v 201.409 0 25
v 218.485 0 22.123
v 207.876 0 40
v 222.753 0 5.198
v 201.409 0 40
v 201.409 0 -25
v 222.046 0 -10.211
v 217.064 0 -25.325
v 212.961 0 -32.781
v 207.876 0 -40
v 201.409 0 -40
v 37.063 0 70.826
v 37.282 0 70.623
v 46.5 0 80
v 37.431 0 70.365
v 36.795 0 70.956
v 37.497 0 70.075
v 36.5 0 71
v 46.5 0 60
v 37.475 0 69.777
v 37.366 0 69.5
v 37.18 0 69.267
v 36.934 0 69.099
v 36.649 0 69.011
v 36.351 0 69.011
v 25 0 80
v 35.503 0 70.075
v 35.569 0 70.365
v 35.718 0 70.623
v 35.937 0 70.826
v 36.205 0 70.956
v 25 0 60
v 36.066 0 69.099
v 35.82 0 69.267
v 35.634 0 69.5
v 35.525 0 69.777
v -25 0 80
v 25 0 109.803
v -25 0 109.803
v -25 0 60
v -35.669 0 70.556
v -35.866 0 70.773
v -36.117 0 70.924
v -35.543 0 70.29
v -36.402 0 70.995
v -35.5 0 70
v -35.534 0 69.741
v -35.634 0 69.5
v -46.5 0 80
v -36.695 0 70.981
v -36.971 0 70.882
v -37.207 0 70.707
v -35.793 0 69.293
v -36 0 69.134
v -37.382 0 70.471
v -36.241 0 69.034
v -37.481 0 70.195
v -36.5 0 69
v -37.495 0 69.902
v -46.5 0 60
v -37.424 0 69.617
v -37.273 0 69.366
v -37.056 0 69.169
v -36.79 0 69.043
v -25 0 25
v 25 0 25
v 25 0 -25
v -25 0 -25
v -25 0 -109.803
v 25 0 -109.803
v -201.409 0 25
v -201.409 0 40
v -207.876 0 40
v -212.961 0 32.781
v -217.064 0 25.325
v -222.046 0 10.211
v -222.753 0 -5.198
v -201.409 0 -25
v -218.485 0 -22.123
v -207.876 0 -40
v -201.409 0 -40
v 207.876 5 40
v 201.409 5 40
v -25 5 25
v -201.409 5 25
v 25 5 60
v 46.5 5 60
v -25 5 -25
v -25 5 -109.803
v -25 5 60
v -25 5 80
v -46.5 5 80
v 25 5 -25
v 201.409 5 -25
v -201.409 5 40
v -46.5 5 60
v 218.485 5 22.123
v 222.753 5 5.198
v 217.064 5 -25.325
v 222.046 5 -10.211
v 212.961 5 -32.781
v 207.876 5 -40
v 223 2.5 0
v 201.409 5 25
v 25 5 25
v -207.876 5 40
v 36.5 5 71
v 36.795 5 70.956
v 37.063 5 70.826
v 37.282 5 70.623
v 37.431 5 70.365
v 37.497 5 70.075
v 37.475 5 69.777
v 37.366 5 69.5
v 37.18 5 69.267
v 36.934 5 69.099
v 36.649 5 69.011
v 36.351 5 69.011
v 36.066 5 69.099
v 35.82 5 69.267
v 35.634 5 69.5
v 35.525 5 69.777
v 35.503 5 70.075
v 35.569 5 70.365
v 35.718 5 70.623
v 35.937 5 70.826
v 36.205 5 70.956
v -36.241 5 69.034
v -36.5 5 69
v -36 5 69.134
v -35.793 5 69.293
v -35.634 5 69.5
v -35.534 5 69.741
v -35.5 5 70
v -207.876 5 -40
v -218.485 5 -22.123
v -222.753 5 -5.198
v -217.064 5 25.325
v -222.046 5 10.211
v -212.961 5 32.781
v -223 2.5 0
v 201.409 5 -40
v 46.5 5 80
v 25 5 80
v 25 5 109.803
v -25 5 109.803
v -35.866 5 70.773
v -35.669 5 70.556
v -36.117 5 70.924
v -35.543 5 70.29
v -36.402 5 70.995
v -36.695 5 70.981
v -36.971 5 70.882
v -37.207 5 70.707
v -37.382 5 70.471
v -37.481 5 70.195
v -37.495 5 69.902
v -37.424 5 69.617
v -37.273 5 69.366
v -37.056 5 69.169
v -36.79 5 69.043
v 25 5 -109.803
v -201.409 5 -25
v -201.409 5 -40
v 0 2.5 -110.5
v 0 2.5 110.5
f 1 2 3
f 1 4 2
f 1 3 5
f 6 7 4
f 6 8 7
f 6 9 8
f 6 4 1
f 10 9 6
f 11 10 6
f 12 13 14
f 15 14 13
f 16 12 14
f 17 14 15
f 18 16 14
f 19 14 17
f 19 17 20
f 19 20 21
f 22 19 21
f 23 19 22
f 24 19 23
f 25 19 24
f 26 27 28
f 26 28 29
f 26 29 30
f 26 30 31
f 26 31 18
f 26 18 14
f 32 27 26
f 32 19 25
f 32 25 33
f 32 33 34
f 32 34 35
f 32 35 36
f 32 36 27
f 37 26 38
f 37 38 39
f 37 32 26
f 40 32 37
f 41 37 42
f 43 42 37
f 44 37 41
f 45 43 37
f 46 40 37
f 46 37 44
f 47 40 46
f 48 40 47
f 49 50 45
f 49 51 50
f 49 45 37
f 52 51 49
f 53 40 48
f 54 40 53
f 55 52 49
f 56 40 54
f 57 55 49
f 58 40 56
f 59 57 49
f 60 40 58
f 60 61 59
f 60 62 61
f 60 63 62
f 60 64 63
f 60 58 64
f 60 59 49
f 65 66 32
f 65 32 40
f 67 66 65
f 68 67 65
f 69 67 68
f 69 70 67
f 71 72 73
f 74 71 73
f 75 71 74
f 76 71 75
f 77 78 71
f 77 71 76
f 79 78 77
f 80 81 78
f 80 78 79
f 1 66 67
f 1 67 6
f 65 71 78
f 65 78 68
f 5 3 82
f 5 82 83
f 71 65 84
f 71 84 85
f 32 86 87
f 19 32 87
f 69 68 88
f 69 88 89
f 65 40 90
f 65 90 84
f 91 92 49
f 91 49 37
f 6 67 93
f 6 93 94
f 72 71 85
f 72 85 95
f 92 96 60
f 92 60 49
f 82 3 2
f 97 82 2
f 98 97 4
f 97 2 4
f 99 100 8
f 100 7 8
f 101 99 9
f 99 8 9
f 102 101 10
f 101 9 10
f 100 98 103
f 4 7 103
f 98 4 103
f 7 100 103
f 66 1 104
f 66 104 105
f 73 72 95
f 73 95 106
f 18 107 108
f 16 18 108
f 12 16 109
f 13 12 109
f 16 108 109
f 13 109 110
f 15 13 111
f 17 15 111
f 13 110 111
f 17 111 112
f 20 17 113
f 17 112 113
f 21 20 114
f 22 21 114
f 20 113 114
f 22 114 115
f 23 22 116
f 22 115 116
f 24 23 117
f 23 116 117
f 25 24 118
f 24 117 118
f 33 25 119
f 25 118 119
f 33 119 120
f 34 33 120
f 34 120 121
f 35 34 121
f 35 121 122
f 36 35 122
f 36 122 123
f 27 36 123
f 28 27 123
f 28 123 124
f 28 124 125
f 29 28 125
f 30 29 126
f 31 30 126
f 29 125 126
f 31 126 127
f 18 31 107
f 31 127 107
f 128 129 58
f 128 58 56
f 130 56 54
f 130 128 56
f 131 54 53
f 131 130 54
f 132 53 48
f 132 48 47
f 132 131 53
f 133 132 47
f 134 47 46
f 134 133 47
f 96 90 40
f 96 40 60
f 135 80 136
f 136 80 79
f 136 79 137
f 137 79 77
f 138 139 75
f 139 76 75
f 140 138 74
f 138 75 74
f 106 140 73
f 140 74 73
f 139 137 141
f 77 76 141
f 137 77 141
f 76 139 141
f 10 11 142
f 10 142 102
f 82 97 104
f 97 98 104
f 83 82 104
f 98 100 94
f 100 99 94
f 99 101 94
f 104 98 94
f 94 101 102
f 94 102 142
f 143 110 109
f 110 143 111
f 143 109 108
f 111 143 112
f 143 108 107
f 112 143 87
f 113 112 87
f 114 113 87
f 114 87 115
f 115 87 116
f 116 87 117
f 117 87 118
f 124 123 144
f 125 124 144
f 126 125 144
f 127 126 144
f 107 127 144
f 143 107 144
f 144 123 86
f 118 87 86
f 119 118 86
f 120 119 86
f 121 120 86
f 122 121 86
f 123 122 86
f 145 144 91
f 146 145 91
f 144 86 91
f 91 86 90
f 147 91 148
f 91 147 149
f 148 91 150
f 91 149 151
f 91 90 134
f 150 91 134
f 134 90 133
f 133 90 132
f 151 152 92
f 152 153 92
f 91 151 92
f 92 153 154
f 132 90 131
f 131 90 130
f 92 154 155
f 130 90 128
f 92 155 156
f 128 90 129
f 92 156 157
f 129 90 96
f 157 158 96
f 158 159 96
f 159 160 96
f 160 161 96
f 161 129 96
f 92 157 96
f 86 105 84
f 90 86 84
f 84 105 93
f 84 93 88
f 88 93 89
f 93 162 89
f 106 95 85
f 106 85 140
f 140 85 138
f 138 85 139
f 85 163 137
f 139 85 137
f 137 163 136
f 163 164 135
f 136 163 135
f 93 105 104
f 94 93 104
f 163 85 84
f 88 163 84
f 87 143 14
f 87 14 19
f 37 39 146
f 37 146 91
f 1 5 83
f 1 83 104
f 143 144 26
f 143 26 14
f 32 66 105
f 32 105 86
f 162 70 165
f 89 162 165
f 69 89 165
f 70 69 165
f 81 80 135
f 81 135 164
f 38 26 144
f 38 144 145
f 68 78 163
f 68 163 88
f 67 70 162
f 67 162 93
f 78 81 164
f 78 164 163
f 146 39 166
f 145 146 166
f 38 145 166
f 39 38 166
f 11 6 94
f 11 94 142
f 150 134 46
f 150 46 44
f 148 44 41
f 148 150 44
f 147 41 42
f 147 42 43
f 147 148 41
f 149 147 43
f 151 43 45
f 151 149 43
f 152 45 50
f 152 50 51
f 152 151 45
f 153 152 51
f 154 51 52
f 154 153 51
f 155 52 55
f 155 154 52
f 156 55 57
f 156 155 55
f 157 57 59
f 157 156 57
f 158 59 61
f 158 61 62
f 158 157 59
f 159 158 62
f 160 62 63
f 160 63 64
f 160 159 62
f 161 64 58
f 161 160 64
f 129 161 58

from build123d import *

# Parameters (mm, degrees)
BOSS_EXTRUDE1_DEPTH = 5
SKETCH3_W           = 21.5
SKETCH3_H           = 20
SKETCH3_R           = 1
BOSS_EXTRUDE2_DEPTH = 5


with BuildPart() as part:
    # Sketch1 → Boss-Extrude1 (new body)
    with BuildSketch(Plane(origin=(0, 0, 0), x_dir=(1, 0, 0), z_dir=(0, 1, 0))):
        with BuildLine():
            Line((25, 25), (201.409203428, 25))
            Line((201.409203428, 25), (201.409203428, 40))
            Line((201.409203428, 40), (207.876498783, 40))
            add(Edge.make_bspline(
                [(207.876498783, -40), (239.223771283, 0), (207.876498783, 40)],
                knots=[2.771189847, 2.771189847, 2.771189847, 3.51199546, 3.51199546, 3.51199546], degree=2, weights=[1, 0.932181609, 1]))
            Line((207.876498783, -40), (201.409203428, -40))
            Line((201.409203428, -40), (201.409203428, -25))
            Line((201.409203428, -25), (25, -25))
            Line((25, -25), (25, -109.803415805))
            add(Edge.make_bspline(
                [(-25, -109.803415805), (0, -111.20100327), (25, -109.803415805)],
                knots=[1.458452535, 1.458452535, 1.458452535, 1.683140119, 1.683140119, 1.683140119], degree=2, weights=[1, 0.993696071, 1]))
            Line((-25, -109.803415805), (-25, -25))
            Line((-25, -25), (-201.409203425, -25))
            Line((-201.409203425, -25), (-201.409203425, -40))
            Line((-201.409203425, -40), (-207.876498783, -40))
            add(Edge.make_bspline(
                [(-207.876498783, 40), (-239.223771283, 0), (-207.876498783, -40)],
                knots=[5.912782501, 5.912782501, 5.912782501, 6.653588114, 6.653588114, 6.653588114], degree=2, weights=[1, 0.932181609, 1]))
            Line((-207.876498783, 40), (-201.409203425, 40))
            Line((-201.409203425, 40), (-201.409203425, 25))
            Line((-201.409203425, 25), (-25, 25))
            Line((-25, 25), (-25, 109.803415805))
            add(Edge.make_bspline(
                [(25, 109.803415805), (0, 111.20100327), (-25, 109.803415805)],
                knots=[4.600045189, 4.600045189, 4.600045189, 4.824732772, 4.824732772, 4.824732772], degree=2, weights=[1, 0.993696071, 1]))
            Line((25, 109.803415805), (25, 25))
        make_face()
    extrude(amount=BOSS_EXTRUDE1_DEPTH)

    # Sketch3 → Boss-Extrude2 (add)
    # profile 1 of 2: a face of its own
    with BuildSketch(Plane(origin=(0, 5, 0), x_dir=(1, 0, 0), z_dir=(0, 1, 0))):
        Polygon((-25, -60), (-36.5, -60), (-46.5, -60), (-46.5, -80), (-25, -80), align=None)
        with BuildLine():
            ThreePointArc((-35.5, -70), (-37.207106781, -70.707106781), (-36.5, -69))
            ThreePointArc((-36.5, -69), (-35.792893219, -69.292893219), (-35.5, -70))
        make_face(mode=Mode.SUBTRACT)
    # profile 2 of 2: a face of its own
    with BuildSketch(Plane(origin=(0, 5, 0), x_dir=(1, 0, 0), z_dir=(0, 1, 0))):
        with Locations((35.75, -70)):
            Rectangle(SKETCH3_W, SKETCH3_H)
        with Locations(Location((36.5, -70, 0), (0, 0, 270))):
            Circle(SKETCH3_R, mode=Mode.SUBTRACT)
    extrude(amount=-BOSS_EXTRUDE2_DEPTH)


solid = part.part
